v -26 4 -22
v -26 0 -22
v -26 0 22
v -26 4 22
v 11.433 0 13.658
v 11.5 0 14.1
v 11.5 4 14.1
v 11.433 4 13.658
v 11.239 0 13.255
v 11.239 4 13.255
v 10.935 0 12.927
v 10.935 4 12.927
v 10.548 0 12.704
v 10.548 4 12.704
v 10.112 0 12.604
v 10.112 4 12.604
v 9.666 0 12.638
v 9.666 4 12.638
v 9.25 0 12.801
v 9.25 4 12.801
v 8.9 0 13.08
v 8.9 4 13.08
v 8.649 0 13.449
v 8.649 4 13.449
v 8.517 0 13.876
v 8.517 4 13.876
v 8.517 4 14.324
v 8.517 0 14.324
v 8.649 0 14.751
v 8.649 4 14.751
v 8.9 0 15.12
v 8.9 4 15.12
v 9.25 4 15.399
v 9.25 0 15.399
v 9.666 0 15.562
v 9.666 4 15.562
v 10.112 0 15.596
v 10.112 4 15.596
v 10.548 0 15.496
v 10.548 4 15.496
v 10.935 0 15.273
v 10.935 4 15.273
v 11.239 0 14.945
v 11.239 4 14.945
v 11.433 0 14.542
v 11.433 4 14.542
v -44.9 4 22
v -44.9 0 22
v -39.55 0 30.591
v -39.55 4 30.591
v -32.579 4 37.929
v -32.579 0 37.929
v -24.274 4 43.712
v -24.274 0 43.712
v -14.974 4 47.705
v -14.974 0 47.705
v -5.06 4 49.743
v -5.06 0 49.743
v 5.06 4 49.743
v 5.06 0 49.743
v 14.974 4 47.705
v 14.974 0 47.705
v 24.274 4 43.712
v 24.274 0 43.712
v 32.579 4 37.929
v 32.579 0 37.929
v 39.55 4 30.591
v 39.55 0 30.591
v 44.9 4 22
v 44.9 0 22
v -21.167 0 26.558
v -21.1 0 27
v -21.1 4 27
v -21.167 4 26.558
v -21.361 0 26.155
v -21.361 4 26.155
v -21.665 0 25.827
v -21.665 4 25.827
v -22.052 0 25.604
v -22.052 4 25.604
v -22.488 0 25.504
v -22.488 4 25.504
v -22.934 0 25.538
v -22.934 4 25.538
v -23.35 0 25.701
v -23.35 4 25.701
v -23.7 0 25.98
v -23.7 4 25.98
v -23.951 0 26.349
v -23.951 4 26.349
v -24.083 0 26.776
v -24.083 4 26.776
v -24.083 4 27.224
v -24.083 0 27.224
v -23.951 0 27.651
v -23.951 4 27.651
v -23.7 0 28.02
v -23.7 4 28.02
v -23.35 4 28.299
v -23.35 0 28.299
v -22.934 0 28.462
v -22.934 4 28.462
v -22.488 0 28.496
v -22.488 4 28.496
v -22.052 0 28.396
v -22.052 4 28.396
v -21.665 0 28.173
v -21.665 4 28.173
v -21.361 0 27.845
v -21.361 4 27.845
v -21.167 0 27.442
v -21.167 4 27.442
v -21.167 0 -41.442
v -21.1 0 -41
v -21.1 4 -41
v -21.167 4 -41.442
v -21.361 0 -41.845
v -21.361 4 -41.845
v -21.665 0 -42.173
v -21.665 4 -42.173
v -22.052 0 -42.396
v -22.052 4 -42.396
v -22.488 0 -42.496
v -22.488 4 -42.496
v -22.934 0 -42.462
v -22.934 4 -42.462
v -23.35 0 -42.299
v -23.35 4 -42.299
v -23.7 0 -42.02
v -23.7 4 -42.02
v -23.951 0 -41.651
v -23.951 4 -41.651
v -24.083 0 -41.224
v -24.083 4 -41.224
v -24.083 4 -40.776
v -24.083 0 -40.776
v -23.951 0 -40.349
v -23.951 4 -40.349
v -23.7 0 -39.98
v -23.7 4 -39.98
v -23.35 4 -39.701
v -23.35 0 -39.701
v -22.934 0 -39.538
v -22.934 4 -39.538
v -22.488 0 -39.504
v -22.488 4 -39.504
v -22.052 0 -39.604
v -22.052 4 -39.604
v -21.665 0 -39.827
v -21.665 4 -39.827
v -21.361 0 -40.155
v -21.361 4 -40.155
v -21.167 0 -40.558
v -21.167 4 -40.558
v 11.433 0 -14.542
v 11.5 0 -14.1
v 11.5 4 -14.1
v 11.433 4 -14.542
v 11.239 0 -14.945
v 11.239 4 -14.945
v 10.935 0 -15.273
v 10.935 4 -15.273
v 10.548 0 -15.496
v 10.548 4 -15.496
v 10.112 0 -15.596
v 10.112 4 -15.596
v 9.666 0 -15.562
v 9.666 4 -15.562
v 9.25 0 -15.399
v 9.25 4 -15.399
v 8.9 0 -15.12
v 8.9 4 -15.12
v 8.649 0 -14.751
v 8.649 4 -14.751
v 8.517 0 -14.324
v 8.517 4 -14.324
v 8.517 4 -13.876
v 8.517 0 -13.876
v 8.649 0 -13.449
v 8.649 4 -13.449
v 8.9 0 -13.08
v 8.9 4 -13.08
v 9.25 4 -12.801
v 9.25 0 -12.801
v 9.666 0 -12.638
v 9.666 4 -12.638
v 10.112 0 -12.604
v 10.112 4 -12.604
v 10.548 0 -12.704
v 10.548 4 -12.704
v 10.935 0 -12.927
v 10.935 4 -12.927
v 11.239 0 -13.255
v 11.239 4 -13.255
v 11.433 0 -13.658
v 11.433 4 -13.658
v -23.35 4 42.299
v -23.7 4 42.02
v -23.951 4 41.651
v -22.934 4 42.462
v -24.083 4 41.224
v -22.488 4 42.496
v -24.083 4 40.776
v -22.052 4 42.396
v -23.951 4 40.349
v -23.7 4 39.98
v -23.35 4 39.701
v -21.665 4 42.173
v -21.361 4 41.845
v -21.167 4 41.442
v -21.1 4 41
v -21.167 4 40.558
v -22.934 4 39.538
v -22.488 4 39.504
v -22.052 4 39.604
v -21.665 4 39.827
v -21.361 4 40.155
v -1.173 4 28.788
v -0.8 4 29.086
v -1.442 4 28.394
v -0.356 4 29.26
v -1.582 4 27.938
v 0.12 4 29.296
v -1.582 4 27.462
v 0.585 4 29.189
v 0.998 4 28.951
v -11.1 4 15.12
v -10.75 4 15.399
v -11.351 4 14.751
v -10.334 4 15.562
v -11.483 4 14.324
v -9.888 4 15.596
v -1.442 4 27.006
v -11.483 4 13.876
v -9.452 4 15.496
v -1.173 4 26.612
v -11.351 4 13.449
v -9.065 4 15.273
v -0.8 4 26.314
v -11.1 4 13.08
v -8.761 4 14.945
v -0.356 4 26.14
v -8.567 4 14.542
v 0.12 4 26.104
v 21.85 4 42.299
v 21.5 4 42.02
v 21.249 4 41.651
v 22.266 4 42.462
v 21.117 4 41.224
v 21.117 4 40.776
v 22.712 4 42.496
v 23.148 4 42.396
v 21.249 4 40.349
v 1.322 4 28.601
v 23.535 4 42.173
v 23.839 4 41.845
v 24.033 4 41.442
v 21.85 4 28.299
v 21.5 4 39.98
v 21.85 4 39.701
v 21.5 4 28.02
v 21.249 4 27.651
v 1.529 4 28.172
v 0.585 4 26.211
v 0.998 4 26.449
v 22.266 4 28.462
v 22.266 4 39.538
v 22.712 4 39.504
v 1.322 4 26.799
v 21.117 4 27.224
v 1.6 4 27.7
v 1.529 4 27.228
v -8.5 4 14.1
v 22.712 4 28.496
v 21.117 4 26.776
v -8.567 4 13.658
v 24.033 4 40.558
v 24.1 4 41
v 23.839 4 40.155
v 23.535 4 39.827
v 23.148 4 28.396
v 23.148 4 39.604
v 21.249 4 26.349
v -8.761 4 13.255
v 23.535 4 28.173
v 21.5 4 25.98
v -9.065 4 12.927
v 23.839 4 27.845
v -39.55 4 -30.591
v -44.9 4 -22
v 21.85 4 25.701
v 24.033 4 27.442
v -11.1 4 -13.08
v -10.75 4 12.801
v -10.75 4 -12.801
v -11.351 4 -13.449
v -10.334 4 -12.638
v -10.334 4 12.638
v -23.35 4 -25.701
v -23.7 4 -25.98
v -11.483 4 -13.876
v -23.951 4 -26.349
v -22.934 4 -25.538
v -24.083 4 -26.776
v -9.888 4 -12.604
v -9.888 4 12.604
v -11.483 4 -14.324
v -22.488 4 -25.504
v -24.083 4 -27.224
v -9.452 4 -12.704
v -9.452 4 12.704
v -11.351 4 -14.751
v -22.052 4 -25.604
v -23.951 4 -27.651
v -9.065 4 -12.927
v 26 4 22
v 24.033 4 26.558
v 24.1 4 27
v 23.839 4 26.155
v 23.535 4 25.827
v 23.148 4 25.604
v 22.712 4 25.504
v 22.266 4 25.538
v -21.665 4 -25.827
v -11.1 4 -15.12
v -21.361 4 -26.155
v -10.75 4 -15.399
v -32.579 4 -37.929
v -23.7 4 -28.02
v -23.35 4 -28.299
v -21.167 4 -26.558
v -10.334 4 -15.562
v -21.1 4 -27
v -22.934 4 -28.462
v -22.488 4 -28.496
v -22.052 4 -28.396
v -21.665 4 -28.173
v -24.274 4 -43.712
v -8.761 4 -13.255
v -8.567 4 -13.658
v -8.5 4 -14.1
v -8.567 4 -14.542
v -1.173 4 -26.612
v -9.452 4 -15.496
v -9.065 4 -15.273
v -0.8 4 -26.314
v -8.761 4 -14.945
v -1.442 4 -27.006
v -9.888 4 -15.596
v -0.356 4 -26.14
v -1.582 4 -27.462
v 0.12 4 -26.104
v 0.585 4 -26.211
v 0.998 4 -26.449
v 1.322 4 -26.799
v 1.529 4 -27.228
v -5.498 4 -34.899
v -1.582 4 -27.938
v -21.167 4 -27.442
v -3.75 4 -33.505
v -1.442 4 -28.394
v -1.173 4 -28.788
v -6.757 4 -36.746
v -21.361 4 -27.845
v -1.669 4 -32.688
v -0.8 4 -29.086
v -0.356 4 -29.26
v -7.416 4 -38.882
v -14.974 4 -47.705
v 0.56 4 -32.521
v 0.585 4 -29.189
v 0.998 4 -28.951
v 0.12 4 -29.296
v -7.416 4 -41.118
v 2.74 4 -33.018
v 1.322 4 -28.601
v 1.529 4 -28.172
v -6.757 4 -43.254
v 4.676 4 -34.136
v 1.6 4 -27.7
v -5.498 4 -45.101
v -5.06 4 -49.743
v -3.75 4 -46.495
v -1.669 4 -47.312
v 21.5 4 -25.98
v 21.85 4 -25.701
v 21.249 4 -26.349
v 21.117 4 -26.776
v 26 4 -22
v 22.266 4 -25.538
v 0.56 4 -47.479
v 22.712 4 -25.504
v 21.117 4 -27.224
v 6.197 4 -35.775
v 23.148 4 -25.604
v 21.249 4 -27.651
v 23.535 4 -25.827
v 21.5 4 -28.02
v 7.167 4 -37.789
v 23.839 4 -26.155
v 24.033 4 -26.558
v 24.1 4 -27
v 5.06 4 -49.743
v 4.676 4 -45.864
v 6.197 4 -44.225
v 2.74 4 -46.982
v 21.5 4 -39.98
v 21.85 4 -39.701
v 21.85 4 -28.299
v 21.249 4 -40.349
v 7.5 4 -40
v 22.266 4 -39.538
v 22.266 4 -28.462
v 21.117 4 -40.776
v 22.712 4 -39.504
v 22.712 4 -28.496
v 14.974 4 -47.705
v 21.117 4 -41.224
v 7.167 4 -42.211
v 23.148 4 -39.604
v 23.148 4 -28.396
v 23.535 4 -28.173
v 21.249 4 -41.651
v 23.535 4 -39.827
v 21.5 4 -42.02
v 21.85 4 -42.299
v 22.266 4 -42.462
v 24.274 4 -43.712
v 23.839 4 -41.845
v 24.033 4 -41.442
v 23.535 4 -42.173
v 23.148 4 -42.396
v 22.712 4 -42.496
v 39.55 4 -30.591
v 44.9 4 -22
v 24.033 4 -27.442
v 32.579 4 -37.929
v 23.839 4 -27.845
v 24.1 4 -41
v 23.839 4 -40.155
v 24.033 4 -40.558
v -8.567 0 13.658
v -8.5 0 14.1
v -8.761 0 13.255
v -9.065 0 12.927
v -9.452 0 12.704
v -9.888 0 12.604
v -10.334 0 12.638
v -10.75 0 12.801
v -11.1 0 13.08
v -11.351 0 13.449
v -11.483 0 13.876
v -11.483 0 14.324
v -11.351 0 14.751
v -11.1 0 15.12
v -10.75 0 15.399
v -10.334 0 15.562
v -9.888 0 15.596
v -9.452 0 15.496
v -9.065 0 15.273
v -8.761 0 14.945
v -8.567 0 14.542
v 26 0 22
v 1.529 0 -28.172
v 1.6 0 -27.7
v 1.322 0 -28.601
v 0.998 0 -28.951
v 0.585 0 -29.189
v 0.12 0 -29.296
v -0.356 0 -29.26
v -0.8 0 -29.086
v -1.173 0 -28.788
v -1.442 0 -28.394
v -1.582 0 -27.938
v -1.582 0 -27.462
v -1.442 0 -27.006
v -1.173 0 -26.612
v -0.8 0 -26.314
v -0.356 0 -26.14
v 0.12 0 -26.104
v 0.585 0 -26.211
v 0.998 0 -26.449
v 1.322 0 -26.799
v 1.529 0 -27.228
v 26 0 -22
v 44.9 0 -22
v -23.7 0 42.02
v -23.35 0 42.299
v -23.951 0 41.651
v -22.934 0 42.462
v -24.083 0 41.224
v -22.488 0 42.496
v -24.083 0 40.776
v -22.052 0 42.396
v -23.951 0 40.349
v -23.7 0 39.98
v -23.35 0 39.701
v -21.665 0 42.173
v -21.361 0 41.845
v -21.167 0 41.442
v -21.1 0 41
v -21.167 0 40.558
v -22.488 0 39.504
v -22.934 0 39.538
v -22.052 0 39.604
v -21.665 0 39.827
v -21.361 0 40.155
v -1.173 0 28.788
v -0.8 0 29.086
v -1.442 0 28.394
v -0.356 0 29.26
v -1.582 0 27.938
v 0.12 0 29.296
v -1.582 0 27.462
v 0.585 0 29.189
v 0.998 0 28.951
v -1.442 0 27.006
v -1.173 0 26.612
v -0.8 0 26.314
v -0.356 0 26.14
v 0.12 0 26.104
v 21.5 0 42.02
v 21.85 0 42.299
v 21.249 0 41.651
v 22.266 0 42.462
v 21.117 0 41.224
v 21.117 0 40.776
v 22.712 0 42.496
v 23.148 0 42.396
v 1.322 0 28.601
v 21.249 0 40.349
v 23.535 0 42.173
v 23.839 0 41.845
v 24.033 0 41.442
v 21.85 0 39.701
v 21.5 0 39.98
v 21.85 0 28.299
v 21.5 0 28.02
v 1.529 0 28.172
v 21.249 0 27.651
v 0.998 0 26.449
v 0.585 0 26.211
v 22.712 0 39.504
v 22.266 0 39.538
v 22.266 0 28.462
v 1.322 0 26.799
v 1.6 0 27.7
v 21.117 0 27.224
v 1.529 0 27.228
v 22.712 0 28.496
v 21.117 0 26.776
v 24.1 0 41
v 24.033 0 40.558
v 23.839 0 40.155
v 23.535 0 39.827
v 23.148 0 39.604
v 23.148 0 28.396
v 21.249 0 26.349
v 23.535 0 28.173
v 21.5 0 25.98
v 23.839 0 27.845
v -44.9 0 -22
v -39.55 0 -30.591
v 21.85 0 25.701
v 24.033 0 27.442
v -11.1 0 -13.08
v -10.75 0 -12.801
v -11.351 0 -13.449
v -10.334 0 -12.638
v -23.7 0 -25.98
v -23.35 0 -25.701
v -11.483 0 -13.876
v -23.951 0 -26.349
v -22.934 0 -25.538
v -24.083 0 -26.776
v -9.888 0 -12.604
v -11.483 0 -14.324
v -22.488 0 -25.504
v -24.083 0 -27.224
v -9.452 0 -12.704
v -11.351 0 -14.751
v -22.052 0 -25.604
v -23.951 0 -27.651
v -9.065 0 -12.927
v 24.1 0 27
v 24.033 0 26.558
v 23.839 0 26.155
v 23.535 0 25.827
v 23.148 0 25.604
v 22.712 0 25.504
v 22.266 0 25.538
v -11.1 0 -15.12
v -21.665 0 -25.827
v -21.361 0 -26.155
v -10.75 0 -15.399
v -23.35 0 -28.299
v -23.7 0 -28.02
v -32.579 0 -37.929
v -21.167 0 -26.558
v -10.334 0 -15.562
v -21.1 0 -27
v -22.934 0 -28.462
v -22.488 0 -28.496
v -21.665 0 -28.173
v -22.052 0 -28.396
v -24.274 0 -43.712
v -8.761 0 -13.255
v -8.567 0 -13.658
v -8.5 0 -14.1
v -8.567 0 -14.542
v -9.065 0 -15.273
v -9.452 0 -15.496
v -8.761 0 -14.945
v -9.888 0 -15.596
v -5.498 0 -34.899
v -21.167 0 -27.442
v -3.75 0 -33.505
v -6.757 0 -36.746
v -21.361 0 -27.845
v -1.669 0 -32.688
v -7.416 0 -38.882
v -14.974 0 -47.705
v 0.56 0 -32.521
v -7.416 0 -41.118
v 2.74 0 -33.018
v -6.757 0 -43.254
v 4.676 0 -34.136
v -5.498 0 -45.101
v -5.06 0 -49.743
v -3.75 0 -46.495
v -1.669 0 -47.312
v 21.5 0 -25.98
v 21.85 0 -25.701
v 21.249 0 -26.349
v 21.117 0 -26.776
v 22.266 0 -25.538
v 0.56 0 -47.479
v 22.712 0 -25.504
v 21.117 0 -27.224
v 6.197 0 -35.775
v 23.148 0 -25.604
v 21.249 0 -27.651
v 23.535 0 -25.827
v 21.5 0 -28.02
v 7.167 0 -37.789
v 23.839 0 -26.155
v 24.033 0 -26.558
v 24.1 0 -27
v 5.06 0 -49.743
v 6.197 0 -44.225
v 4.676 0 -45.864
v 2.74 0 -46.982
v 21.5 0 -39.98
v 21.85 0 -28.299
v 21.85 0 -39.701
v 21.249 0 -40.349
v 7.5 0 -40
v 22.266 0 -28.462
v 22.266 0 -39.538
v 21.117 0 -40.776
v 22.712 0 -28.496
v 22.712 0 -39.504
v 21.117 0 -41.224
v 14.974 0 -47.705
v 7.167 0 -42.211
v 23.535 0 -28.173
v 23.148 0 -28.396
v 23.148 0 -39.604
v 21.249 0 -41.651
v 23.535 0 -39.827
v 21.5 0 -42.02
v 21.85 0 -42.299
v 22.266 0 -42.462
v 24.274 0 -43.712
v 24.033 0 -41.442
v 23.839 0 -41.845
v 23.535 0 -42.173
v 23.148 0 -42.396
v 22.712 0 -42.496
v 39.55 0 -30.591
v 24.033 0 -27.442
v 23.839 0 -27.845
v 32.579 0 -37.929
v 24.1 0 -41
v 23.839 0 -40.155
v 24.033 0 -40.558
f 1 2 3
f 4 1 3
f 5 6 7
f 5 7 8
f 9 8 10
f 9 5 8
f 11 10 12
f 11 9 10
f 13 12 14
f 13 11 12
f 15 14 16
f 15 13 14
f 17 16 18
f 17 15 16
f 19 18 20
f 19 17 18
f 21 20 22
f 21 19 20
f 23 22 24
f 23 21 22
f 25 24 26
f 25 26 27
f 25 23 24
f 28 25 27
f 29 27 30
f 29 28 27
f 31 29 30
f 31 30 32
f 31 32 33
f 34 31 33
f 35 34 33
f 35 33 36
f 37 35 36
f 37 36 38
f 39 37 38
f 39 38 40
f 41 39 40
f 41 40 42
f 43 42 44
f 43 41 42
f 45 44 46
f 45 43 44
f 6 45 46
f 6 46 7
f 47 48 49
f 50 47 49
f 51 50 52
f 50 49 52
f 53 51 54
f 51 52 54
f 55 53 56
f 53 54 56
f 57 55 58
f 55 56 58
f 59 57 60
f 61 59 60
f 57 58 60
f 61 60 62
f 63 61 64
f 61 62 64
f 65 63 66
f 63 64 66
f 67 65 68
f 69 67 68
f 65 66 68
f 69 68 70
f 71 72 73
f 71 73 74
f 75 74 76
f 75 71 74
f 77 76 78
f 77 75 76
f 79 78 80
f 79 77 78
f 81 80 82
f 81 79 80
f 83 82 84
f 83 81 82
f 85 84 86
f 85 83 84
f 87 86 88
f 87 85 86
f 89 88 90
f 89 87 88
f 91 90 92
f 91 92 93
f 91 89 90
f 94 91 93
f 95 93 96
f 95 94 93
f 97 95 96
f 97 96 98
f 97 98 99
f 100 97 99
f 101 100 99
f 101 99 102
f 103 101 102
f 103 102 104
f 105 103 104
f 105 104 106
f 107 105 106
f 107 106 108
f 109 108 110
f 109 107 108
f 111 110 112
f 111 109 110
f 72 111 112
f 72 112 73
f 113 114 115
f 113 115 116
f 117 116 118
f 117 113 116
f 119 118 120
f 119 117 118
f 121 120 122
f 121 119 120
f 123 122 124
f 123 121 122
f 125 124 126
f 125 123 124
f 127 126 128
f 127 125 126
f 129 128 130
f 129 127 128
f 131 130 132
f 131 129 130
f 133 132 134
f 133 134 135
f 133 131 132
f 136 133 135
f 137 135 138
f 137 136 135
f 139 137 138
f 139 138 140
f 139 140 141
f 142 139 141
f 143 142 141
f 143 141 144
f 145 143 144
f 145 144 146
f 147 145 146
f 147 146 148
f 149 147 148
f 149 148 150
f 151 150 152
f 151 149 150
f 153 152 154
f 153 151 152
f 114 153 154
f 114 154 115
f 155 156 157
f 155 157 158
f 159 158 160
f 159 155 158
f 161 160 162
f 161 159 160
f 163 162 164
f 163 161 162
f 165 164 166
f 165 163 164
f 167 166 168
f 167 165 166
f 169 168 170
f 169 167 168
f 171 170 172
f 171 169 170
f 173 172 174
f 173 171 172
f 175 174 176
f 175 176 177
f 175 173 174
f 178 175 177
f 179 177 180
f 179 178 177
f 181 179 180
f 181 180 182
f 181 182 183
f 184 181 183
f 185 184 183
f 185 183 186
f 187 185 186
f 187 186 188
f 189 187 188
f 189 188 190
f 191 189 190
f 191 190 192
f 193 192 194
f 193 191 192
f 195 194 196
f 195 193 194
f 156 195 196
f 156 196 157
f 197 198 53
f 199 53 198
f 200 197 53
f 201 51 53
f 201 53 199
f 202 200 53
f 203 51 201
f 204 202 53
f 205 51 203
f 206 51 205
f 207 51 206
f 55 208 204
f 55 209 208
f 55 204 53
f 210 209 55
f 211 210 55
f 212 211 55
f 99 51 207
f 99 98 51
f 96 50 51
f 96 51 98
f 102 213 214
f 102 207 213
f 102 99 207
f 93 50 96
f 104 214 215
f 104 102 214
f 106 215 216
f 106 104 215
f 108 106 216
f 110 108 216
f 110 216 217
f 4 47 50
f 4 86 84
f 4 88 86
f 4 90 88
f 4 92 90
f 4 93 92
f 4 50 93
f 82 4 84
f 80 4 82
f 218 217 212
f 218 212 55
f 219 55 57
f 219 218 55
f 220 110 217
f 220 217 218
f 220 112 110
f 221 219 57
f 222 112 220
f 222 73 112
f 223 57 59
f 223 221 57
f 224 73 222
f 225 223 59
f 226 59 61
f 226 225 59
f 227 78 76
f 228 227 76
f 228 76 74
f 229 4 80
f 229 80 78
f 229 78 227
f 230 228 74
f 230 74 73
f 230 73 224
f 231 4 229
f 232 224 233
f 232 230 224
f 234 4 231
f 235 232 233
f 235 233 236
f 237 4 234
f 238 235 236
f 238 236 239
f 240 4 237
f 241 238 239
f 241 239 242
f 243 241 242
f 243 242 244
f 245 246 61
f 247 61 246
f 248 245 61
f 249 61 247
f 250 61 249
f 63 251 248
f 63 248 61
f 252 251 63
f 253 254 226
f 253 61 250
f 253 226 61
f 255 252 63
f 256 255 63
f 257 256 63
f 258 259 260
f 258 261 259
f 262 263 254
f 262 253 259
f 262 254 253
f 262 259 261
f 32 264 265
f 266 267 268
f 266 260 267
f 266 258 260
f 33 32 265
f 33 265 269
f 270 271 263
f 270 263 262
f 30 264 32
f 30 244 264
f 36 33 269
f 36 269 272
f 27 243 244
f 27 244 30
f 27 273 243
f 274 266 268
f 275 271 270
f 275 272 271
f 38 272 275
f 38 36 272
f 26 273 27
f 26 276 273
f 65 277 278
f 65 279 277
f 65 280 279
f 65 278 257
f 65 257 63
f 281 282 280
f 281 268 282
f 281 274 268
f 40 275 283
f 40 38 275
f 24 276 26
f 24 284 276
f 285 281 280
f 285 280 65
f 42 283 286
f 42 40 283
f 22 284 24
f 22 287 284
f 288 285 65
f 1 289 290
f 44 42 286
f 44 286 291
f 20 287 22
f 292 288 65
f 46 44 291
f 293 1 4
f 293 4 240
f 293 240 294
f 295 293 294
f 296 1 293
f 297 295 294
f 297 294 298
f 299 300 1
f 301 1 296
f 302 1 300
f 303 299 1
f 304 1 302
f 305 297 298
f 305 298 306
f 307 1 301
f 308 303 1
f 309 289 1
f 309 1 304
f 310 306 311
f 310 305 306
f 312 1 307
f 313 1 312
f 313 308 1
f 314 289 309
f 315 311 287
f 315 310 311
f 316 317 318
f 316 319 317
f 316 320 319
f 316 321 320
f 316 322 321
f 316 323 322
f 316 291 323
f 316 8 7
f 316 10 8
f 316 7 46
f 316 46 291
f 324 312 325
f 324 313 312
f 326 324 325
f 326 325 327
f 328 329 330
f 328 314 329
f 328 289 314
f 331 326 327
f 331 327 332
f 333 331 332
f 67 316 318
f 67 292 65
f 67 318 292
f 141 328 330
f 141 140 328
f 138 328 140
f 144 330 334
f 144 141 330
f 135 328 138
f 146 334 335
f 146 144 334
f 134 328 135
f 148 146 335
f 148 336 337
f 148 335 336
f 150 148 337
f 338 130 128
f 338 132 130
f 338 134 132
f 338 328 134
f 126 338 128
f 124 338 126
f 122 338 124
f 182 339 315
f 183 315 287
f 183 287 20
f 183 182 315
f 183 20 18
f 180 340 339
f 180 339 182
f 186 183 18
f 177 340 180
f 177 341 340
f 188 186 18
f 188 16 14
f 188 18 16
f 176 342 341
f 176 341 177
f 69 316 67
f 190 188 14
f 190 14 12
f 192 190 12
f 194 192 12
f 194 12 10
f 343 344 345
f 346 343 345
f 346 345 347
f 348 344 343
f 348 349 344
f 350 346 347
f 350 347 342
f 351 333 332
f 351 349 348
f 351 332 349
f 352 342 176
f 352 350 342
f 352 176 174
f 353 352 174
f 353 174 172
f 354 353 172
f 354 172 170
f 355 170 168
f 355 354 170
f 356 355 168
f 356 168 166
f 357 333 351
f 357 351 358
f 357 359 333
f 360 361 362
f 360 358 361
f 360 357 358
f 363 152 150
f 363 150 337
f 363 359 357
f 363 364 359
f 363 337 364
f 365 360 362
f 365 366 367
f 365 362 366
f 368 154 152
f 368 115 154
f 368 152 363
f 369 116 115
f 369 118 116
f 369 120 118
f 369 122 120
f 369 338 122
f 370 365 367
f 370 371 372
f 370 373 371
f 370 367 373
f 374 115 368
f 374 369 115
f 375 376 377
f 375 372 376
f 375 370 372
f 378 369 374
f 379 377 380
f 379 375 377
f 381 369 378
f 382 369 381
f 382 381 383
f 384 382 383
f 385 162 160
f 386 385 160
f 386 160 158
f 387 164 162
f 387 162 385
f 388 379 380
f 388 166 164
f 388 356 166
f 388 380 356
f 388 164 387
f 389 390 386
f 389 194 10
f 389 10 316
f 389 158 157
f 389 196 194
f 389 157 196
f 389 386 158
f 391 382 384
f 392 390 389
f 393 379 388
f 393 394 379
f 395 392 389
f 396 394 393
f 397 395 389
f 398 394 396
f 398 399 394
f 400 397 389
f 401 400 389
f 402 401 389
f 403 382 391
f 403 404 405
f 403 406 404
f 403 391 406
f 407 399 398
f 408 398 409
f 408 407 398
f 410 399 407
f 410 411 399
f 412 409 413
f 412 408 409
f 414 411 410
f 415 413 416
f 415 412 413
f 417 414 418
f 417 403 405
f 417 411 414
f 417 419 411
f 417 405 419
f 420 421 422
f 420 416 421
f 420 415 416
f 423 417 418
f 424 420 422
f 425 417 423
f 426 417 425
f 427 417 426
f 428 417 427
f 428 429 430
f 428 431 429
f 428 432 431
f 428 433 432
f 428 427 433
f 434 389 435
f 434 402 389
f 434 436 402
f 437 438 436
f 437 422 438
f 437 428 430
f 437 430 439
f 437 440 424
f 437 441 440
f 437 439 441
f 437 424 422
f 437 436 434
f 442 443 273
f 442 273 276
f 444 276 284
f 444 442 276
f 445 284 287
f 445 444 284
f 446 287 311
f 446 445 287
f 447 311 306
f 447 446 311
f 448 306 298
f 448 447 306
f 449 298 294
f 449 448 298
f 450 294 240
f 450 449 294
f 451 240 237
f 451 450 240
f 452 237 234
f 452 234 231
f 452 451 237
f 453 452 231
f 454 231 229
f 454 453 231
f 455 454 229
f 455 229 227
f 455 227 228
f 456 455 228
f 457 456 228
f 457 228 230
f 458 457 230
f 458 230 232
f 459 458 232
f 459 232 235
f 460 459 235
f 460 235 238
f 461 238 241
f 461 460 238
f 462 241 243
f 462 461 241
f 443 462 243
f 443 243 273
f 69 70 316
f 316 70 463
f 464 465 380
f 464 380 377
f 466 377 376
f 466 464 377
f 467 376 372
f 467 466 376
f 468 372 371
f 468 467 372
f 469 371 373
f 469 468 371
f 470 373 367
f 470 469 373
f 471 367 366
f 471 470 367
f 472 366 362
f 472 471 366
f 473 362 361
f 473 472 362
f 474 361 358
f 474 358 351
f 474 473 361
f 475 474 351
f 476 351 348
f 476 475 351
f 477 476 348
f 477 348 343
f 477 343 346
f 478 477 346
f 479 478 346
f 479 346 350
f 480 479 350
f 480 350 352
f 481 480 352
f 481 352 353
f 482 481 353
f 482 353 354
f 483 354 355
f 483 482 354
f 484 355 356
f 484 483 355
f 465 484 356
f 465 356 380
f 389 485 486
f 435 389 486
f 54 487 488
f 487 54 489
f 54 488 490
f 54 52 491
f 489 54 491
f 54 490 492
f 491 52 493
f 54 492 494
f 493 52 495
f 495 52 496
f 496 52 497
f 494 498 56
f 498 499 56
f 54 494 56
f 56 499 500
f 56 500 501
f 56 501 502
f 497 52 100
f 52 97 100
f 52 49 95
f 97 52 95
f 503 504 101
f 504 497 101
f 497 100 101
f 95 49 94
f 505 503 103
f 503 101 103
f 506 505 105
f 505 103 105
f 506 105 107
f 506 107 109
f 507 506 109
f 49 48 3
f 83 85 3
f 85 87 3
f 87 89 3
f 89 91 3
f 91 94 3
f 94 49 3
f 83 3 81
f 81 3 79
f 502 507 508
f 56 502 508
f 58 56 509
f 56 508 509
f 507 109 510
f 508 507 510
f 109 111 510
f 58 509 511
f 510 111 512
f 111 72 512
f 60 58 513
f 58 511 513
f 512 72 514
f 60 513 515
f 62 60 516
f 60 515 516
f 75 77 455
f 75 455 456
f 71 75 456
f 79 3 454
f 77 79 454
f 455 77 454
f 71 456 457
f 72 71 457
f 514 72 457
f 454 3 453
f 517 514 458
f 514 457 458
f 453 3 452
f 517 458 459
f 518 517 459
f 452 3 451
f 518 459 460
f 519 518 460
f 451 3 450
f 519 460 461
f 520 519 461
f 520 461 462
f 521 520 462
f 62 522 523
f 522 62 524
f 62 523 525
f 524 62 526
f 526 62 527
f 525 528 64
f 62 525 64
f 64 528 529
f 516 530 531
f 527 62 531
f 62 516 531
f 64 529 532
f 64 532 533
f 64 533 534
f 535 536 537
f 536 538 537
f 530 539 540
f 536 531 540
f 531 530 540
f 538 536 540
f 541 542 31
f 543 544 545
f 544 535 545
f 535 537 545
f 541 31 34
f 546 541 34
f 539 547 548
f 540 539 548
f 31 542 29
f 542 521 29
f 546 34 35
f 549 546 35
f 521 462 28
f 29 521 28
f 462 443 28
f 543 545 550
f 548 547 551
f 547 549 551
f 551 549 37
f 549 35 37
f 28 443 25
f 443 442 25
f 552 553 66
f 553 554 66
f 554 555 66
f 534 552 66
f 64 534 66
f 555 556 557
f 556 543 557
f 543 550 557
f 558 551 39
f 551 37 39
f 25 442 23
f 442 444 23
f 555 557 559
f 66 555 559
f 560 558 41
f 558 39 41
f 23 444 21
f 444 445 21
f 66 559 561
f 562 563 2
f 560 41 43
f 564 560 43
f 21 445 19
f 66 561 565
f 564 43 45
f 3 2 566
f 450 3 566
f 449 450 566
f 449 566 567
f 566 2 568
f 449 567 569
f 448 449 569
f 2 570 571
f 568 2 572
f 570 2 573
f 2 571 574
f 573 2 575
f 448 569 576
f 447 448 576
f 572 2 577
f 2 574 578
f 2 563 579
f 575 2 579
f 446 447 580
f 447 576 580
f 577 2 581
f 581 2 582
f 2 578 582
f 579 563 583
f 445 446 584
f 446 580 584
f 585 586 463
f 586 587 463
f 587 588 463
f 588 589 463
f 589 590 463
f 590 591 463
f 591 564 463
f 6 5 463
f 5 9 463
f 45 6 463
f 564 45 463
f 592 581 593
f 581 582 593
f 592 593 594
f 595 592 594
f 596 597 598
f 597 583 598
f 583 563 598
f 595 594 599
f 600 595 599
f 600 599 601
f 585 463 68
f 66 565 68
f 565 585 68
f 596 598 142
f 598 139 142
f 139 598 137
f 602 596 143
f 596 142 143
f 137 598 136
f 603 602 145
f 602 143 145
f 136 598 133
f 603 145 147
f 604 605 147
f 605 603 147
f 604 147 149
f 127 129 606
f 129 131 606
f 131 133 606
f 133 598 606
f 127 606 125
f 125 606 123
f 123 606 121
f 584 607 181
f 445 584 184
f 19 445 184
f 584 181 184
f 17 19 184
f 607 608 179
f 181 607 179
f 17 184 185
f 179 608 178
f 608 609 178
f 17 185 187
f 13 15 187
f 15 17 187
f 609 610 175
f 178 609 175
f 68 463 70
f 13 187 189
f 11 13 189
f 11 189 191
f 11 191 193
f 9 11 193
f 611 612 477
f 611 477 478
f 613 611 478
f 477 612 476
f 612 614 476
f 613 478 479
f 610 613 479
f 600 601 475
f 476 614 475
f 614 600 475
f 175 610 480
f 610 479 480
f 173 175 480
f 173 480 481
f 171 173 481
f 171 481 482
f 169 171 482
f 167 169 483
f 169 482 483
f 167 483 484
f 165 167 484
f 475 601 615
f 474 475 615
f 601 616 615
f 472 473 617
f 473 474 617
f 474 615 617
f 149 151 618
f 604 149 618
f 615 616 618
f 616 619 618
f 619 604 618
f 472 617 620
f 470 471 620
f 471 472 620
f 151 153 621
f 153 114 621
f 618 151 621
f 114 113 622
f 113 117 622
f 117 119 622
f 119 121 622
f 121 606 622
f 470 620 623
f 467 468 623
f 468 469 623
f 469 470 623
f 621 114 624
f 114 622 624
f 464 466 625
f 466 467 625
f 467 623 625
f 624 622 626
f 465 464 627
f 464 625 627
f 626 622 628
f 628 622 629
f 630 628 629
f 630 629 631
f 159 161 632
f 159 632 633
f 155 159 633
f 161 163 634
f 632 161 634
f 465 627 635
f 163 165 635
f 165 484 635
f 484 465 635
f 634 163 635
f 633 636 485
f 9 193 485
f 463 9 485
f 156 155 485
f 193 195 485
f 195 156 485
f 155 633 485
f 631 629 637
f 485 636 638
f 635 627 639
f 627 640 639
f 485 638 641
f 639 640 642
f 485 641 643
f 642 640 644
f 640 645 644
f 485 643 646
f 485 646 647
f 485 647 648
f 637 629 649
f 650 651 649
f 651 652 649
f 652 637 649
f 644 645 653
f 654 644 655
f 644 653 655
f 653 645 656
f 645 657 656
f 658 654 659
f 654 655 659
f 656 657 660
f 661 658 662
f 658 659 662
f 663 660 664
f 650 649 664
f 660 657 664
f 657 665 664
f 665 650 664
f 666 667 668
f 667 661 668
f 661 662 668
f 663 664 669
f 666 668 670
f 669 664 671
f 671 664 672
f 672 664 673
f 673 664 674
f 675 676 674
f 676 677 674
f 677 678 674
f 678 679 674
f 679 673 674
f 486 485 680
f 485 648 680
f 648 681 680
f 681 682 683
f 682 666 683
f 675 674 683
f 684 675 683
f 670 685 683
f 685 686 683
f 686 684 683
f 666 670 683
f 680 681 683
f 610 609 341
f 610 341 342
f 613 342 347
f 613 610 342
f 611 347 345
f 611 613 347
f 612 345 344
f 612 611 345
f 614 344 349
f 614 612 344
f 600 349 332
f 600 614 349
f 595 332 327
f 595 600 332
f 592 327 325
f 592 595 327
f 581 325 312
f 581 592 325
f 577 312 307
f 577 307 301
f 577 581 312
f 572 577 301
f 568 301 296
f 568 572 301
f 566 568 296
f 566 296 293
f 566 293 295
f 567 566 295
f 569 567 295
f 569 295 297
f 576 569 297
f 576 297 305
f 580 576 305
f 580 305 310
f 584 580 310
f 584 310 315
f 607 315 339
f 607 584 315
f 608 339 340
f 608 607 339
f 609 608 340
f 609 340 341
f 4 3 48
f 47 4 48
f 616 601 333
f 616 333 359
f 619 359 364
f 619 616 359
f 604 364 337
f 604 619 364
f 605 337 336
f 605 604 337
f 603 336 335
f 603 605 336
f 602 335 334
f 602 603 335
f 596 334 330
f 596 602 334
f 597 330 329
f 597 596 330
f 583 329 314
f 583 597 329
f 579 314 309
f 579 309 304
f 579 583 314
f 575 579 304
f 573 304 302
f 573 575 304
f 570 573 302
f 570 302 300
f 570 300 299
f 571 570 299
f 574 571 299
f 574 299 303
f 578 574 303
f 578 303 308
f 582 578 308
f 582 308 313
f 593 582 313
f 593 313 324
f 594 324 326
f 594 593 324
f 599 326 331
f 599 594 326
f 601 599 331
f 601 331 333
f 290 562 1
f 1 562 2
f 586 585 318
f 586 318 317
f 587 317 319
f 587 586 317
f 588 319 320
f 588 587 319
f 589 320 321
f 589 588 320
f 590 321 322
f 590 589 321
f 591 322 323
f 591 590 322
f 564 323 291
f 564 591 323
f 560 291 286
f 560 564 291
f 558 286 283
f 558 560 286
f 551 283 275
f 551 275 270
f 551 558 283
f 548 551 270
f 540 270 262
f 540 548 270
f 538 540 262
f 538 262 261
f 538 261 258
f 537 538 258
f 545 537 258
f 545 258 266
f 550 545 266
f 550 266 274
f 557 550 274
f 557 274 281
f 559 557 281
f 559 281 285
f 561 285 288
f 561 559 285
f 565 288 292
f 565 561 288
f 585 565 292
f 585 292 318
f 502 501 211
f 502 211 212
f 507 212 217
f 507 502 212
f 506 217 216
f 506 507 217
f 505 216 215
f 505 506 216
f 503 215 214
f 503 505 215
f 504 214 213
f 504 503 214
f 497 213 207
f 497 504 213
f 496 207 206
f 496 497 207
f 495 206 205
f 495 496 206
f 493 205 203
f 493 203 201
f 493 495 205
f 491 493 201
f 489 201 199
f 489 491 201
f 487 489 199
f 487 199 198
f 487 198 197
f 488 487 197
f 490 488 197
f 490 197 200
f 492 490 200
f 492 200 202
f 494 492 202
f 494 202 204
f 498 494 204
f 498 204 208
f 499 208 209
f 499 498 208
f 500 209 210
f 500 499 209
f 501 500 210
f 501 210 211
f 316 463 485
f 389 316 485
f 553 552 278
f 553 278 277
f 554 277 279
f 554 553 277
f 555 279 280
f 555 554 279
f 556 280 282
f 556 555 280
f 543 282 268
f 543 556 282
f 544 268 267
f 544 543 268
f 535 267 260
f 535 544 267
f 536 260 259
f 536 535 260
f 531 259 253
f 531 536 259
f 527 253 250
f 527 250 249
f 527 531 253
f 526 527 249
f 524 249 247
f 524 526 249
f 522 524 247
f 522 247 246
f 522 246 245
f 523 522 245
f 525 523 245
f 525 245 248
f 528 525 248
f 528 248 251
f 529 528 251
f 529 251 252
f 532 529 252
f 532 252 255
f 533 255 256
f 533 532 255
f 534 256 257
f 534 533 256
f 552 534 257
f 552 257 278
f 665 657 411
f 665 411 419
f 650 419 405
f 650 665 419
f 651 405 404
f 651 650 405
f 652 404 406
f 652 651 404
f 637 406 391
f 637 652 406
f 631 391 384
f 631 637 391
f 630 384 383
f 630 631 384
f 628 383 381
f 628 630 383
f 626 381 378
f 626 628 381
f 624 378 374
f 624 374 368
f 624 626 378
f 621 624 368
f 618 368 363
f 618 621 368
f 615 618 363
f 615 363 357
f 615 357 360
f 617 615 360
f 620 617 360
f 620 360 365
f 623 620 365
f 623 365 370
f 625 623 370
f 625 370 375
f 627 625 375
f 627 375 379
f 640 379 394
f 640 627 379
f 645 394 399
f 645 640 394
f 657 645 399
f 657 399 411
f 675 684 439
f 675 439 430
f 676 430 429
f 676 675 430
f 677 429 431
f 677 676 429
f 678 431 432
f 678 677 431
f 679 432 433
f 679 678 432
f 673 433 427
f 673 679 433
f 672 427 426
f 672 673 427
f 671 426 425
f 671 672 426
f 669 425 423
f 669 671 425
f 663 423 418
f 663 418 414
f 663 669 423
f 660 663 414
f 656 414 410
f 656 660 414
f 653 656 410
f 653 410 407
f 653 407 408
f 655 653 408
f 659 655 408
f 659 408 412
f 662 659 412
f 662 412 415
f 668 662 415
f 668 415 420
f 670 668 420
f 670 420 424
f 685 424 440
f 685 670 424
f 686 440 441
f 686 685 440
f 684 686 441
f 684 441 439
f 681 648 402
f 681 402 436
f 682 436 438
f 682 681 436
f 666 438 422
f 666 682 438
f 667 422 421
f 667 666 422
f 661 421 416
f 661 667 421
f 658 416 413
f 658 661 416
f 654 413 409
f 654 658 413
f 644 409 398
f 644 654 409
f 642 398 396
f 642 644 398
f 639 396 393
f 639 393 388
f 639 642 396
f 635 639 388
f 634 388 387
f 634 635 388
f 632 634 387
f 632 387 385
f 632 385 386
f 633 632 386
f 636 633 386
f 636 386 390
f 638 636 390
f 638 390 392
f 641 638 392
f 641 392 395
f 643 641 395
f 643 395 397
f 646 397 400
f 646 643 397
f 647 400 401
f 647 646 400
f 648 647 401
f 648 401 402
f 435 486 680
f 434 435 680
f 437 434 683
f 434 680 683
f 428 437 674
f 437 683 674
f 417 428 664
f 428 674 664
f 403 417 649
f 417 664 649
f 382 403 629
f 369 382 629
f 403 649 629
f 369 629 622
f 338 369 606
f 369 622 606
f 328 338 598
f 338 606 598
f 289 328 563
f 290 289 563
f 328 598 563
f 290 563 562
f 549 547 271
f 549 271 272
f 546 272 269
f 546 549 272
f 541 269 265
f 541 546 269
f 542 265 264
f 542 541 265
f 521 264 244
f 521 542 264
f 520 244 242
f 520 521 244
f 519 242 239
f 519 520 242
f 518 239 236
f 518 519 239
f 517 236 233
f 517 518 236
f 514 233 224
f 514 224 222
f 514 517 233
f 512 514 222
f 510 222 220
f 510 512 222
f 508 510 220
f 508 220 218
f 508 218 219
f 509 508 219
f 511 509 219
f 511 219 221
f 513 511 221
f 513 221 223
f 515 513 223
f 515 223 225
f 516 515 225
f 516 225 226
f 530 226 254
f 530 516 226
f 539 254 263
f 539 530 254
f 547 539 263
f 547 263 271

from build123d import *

# Parameters (mm, degrees)
SKETCH1_R           = 1.5
SKETCH1_R_2         = 1.6
SKETCH1_R_3         = 7.5
BOSS_EXTRUDE1_DEPTH = 4


with BuildPart() as part:
    # Sketch1 → Boss-Extrude1 (new body)
    with BuildSketch(Plane(origin=(0, 0, 0), x_dir=(1, 0, 0), z_dir=(0, 1, 0))):
        with BuildLine():
            Line((-44.899888641, 22), (-26, 22))
            Line((-26, 22), (-26, -22))
            Line((-26, -22), (-44.899888641, -22))
            ThreePointArc((-44.899888641, -22), (0, -50), (44.899888641, -22))
            Line((44.899888641, -22), (26, -22))
            Line((26, -22), (26, 22))
            Line((26, 22), (44.899888641, 22))
            ThreePointArc((44.899888641, 22), (0, 50), (-44.899888641, 22))
        make_face()
        with Locations((-22.6, -41)):
            Circle(SKETCH1_R, mode=Mode.SUBTRACT)
        with Locations((-22.6, -27)):
            Circle(SKETCH1_R, mode=Mode.SUBTRACT)
        with Locations((-10, -14.1)):
            Circle(SKETCH1_R, mode=Mode.SUBTRACT)
        with Locations((0, -27.7)):
            Circle(SKETCH1_R_2, mode=Mode.SUBTRACT)
        with Locations((22.6, -41)):
            Circle(SKETCH1_R, mode=Mode.SUBTRACT)
        with Locations((22.6, -27)):
            Circle(SKETCH1_R, mode=Mode.SUBTRACT)
        with Locations((10, -14.1)):
            Circle(SKETCH1_R, mode=Mode.SUBTRACT)
        with Locations((-10, 14.1)):
            Circle(SKETCH1_R, mode=Mode.SUBTRACT)
        with Locations((-22.6, 27)):
            Circle(SKETCH1_R, mode=Mode.SUBTRACT)
        with Locations((-22.6, 41)):
            Circle(SKETCH1_R, mode=Mode.SUBTRACT)
        with Locations((0, 40)):
            Circle(SKETCH1_R_3, mode=Mode.SUBTRACT)
        with Locations((10, 14.1)):
            Circle(SKETCH1_R, mode=Mode.SUBTRACT)
        with Locations((0, 27.7)):
            Circle(SKETCH1_R_2, mode=Mode.SUBTRACT)
        with Locations((22.6, 27)):
            Circle(SKETCH1_R, mode=Mode.SUBTRACT)
        with Locations((22.6, 41)):
            Circle(SKETCH1_R, mode=Mode.SUBTRACT)
    extrude(amount=BOSS_EXTRUDE1_DEPTH)


solid = part.part
